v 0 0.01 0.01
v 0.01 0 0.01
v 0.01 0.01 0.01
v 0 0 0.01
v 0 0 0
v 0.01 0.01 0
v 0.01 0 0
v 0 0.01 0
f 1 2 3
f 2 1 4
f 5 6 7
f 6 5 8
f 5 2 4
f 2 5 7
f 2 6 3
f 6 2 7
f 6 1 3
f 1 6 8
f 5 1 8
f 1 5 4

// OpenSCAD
// @regression: deliberate
/***
 * @function tooth_placement_validation_cases
 * @brief Deliberate local and boundary failures.  Each assertion confirms that the
 * Source: [`tooth/placement/validation_cases.scad`](tooth/placement/validation_cases.scad)
 *
 * expected diagnostic classification is produced rather than repaired away.
 *
 * The assertions are the test; the final OpenSCAD export is kept valid so the
 * fixture can still be rendered normally.
 */
include <../../../src/common/curve_gears_math.scad>

reversed_frame=[[0,0],[1,0],[0,1],1];
assert(_cg_frame_failure_code(reversed_frame)=="FRAME_NORMAL_REVERSED",
    "expected FRAME_NORMAL_REVERSED");
echo("stage=frame severity=info code=FRAME_NORMAL_REVERSED PASS");

crossing_left=[[0,0],[2,2],[4,0]];
crossing_right=[[0,0],[2,-2],[4,0]];
assert(_cg_has_flank_crossing(crossing_left,crossing_right),
    "expected FLANK_CROSSING");
echo("stage=flank severity=info code=FLANK_CROSSING PASS");

valid_flanks=_cg_reference_tooth_local_flanks(17,1,34,20);
reversed_flank_candidate=_cg_validate_candidate_flanks([valid_flanks[1],valid_flanks[0]]);
assert(!reversed_flank_candidate[0] && reversed_flank_candidate[1]=="FLANK_ORDER_INVALID",
    "expected FLANK_ORDER_INVALID before top geometry");
echo("stage=flank severity=info code=FLANK_ORDER_INVALID PASS");

ambiguous_body=[[0,0],[4,0],[4,4],[0,4]];
ambiguous_tooth=[[-1,2],[5,2],[-1,2]];
ambiguous_hits=_cg_tooth_body_intersections(ambiguous_tooth,ambiguous_body);
assert(len(ambiguous_hits)>=3,"expected BODY_INTERSECTION_AMBIGUOUS");
echo("stage=intersection severity=info code=BODY_INTERSECTION_AMBIGUOUS PASS");

self_intersecting_body=[[0,0],[4,4],[0,4],[4,0]];
self_hits=_cg_polygon_intersections(self_intersecting_body);
assert(len(self_hits)>0,"expected POLYGON_SELF_INTERSECTION");
echo(str("stage=polygon severity=info code=POLYGON_SELF_INTERSECTION PASS segments=",self_hits[0][0],"/",self_hits[0][1]," point=",self_hits[0][2]));

overlap_a=[1,6,0,2];
overlap_b=[3,4,1,4];
assert(_cg_splice_relation(overlap_a,overlap_b)=="SPLICE_INTERVAL_OVERLAP",
    "expected SPLICE_INTERVAL_OVERLAP");
echo("stage=splice severity=info code=SPLICE_INTERVAL_OVERLAP PASS");

interleaved_a=[1,5,0,2];
interleaved_b=[3,7,1,4];
assert(_cg_splice_relation(interleaved_a,interleaved_b)=="SPLICE_INTERVAL_INTERLEAVED",
    "expected SPLICE_INTERVAL_INTERLEAVED");
echo("stage=splice severity=info code=SPLICE_INTERVAL_INTERLEAVED PASS");

function synthetic_placed(index,target,start_s,end_s) =
    ["placed","PASS",index,target,[],[],[],[],[[0,0],0,0,0,0,start_s],[[0,0],0,0,0,0,end_s],[],[]];
synthetic_overlap_failures=_cg_splice_failures([
    synthetic_placed(0,2,1,6),
    synthetic_placed(1,4,3,4)
],10);
assert(len(synthetic_overlap_failures)>0 && synthetic_overlap_failures[0][0]=="SPLICE_INTERVAL_OVERLAP",
    "expected splice validator to report SPLICE_INTERVAL_OVERLAP");
echo("stage=splice severity=info code=SPLICE_INTERVAL_OVERLAP_VALIDATOR PASS");

function synthetic_collision_placed(index,source,boundary) =
    ["placed","PASS",index,0, [source,[1,0],[0,1],1], [], boundary, [],
        [boundary[0],0,0,0,0,0], [boundary[len(boundary)-1],len(boundary)-1,0,0,0,1], [], []];
collision_a=synthetic_collision_placed(0,[0,0],[[-1,0],[1,0]]);
collision_b=synthetic_collision_placed(1,[.1,.1],[[0,-1],[0,1]]);
collision_hits=_cg_final_boundary_collisions([collision_a,collision_b],.8);
assert(len(collision_hits)>0 && collision_hits[0][0]=="TOOTH_COLLISION",
    "expected TOOTH_COLLISION from the source-point broad phase");
echo("stage=collision severity=info code=TOOTH_COLLISION_BROAD_PHASE PASS");

adjacent_collision_a=synthetic_collision_placed(0,[0,0],[[-1,0],[1,0]]);
adjacent_collision_b=synthetic_collision_placed(1,[.1,.1],[[-.5,-1],[-.5,1],[.5,1],[.5,-1]]);
collision_unrelated=synthetic_collision_placed(9,[100,100],[[99,99],[101,101]]);
collision_with_unrelated=_cg_final_boundary_collisions([adjacent_collision_a,adjacent_collision_b,collision_unrelated],.8);
assert(len(collision_with_unrelated)>0 && collision_with_unrelated[0][1]==0 && collision_with_unrelated[0][2]==1,
    "expected multiple adjacent collisions to survive an unrelated placement");
echo("stage=collision severity=info code=TOOTH_COLLISION_ADJACENT_WITH_UNRELATED PASS");

nonadjacent_collision=_cg_final_boundary_collisions([
    synthetic_collision_placed(0,[0,0],[[-1,0],[1,0]]),
    synthetic_collision_placed(2,[.1,.1],[[0,-1],[0,1]])
],.8);
assert(len(nonadjacent_collision)>0 && nonadjacent_collision[0][1]==0 && nonadjacent_collision[0][2]==2,
    "expected a non-adjacent collision");
echo("stage=collision severity=info code=TOOTH_COLLISION_NON_ADJACENT PASS");

collinear_hits=_cg_final_boundary_collisions([
    synthetic_collision_placed(0,[0,0],[[0,0],[2,0]]),
    synthetic_collision_placed(2,[.1,.1],[[1,0],[3,0]])
],.8);
assert(len(collinear_hits)>0 && collinear_hits[0][0]=="TOOTH_COLLISION",
    "expected collinear tooth overlap");
echo("stage=collision severity=info code=TOOTH_COLLISION_COLLINEAR PASS");

containment_hits=_cg_final_boundary_collisions([
    synthetic_collision_placed(0,[0,0],[[-2,-2],[2,-2],[2,2],[-2,2]]),
    synthetic_collision_placed(2,[.1,.1],[[-.5,-.5],[.5,-.5],[.5,.5],[-.5,.5]])
],.8);
assert(len(containment_hits)>0 && containment_hits[0][0]=="TOOTH_COLLISION",
    "expected contained tooth overlap");
echo("stage=collision severity=info code=TOOTH_COLLISION_CONTAINMENT PASS");

top_flank_hits=_cg_final_boundary_collisions([
    synthetic_collision_placed(0,[0,0],[[0,0],[2,2],[4,0],[0,0]]),
    synthetic_collision_placed(2,[.1,.1],[[1,0],[1,3],[3,3],[3,0]])
],.8);
assert(len(top_flank_hits)>0 && top_flank_hits[0][0]=="TOOTH_COLLISION",
    "expected top-to-flank collision");
echo("stage=collision severity=info code=TOOTH_COLLISION_TOP_FLANK PASS");

top_a=synthetic_collision_placed(0,[0,0],[[0,0],[-1,1],[1,1],[0,0]]);
top_b=synthetic_collision_placed(1,[.1,.1],[[0,0],[-1,1],[1,1],[0,0]]);
top_hits=_cg_final_boundary_collisions([top_a,top_b],.8);
top_overlap_hits=[for(hit=top_hits) if(hit[0]=="TOOTH_TOP_OVERLAP") hit];
assert(len(top_overlap_hits)>0,
    "expected TOOTH_TOP_OVERLAP from exact top-segment checking");
echo("stage=collision severity=info code=TOOTH_TOP_OVERLAP PASS");

order_failures=_cg_tooth_order_failures([top_b,top_a]);
assert(len(order_failures)>0 && order_failures[0][0]=="TOOTH_ORDER_CONFLICT",
    "expected TOOTH_ORDER_CONFLICT from reversed candidate order");
echo("stage=collision severity=info code=TOOTH_ORDER_CONFLICT PASS");

assert(abs(_cg_tooth_phase_fraction(90)-.25)<_cg_eps_len(),
    "expected degree tooth phase to map to one quarter contour turn");
echo("stage=placement severity=info code=TOOTH_PHASE_DEGREES PASS");

echo("PASS: deliberate tooth and boundary classifications");

cube([0.01,0.01,0.01]);
